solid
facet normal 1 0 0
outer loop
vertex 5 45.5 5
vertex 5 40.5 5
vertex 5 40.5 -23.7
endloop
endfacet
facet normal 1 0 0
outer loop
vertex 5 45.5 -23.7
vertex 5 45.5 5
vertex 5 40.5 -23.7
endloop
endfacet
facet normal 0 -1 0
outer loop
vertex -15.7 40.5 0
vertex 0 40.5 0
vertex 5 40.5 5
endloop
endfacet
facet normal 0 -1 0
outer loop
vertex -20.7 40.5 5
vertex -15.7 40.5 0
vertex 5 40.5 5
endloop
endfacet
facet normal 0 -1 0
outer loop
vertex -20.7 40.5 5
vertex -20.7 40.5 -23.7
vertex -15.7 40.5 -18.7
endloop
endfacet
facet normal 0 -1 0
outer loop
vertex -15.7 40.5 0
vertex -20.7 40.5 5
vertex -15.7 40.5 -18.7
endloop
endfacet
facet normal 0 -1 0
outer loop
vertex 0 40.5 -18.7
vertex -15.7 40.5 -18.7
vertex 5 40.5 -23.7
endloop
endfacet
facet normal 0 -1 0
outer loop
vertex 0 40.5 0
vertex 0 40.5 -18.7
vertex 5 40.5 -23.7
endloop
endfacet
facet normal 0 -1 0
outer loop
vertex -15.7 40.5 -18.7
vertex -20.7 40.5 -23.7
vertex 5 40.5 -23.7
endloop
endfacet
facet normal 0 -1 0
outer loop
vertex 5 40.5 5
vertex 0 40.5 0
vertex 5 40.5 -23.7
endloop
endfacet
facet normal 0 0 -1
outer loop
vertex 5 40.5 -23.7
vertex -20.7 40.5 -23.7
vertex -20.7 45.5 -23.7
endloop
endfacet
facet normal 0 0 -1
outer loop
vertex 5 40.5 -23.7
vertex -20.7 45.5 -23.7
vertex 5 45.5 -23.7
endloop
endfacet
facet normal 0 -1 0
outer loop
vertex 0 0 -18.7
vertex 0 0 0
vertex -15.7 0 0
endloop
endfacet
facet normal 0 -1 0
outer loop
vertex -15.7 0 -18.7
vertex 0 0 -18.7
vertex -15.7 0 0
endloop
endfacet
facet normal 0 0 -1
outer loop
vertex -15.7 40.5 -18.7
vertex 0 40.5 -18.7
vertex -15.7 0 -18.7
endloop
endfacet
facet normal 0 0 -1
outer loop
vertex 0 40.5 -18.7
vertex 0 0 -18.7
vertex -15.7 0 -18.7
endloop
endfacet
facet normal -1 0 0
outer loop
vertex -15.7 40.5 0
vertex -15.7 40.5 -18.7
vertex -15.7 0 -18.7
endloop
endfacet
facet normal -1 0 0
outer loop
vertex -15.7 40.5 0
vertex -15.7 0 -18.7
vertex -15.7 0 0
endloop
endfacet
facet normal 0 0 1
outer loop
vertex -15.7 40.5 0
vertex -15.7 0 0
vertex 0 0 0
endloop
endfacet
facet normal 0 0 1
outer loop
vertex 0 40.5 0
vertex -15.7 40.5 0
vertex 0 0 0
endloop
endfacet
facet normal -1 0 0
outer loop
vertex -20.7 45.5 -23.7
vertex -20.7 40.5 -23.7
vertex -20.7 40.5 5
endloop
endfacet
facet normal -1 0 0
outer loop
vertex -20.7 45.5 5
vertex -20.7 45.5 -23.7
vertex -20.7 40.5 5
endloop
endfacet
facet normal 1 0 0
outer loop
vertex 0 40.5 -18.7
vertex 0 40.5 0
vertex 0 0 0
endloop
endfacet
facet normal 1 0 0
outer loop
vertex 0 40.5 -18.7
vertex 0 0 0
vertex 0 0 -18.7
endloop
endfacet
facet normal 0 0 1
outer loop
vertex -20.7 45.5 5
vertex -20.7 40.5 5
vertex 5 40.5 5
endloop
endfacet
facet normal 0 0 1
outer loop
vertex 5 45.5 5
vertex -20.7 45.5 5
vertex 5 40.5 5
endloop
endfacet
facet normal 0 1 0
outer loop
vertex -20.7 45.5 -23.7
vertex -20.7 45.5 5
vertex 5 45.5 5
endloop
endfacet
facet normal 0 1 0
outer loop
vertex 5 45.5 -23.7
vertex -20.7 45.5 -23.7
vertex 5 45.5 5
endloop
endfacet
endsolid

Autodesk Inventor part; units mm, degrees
ref_plane "YZ Plane" through (0, 0, 0) normal (1, 0, 0) x (0, 1, 0)
ref_plane "XZ Plane" through (0, 0, 0) normal (0, 1, 0) x (-1, 0, 0)
ref_plane "XY Plane" through (0, 0, 0) normal (0, 0, 1) x (1, 0, 0)
sketch "Sketch1" plane through (0, 0, 0) normal (0, 1, 0) x (-1, 0, 0)
  line L0 (0, 0) -> (0, -18.7)
  line L1 (0, -18.7) -> (0, -11.8708)
  line L2 (0, -18.7) -> (15.7, -18.7)
  line L3 (15.7, -18.7) -> (15.7, 0)
  line L4 (15.7, 0) -> (0, 0)
  dimension "d0" = 18.7
  dimension "d1" = 15.7
extrude "Extrusion1" add sketch "Sketch1" along normal blind 40.5
sketch "Sketch2" plane through (0, 40.5, 0) normal (0, 1, 0) x (1, 0, 0)
  line L0 (0, 0) -> (0, 18.7) projected
  line L1 (0, 18.7) -> (0, 23.7)
  line L2 (0, 23.7) -> (-15.7, 23.7)
  line L3 (-15.7, 23.7) -> (-20.7, 23.7)
  line L4 (-20.7, 23.7) -> (-20.7, 0)
  line L5 (-20.7, 0) -> (-20.7, -5)
  line L6 (-20.7, -5) -> (0, -5)
  line L7 (0, -5) -> (5, -5)
  line L8 (5, -5) -> (5, 18.7)
  line L9 (5, 18.7) -> (5, 23.7)
  line L10 (0, 23.7) -> (5, 23.7)
  dimension "d4" = 5
  dimension "d5" = 5
  dimension "d6" = 5
  dimension "d7" = 5
extrude "Extrusion2" add sketch "Sketch2" along normal blind 5
properties part number "chaveta"
